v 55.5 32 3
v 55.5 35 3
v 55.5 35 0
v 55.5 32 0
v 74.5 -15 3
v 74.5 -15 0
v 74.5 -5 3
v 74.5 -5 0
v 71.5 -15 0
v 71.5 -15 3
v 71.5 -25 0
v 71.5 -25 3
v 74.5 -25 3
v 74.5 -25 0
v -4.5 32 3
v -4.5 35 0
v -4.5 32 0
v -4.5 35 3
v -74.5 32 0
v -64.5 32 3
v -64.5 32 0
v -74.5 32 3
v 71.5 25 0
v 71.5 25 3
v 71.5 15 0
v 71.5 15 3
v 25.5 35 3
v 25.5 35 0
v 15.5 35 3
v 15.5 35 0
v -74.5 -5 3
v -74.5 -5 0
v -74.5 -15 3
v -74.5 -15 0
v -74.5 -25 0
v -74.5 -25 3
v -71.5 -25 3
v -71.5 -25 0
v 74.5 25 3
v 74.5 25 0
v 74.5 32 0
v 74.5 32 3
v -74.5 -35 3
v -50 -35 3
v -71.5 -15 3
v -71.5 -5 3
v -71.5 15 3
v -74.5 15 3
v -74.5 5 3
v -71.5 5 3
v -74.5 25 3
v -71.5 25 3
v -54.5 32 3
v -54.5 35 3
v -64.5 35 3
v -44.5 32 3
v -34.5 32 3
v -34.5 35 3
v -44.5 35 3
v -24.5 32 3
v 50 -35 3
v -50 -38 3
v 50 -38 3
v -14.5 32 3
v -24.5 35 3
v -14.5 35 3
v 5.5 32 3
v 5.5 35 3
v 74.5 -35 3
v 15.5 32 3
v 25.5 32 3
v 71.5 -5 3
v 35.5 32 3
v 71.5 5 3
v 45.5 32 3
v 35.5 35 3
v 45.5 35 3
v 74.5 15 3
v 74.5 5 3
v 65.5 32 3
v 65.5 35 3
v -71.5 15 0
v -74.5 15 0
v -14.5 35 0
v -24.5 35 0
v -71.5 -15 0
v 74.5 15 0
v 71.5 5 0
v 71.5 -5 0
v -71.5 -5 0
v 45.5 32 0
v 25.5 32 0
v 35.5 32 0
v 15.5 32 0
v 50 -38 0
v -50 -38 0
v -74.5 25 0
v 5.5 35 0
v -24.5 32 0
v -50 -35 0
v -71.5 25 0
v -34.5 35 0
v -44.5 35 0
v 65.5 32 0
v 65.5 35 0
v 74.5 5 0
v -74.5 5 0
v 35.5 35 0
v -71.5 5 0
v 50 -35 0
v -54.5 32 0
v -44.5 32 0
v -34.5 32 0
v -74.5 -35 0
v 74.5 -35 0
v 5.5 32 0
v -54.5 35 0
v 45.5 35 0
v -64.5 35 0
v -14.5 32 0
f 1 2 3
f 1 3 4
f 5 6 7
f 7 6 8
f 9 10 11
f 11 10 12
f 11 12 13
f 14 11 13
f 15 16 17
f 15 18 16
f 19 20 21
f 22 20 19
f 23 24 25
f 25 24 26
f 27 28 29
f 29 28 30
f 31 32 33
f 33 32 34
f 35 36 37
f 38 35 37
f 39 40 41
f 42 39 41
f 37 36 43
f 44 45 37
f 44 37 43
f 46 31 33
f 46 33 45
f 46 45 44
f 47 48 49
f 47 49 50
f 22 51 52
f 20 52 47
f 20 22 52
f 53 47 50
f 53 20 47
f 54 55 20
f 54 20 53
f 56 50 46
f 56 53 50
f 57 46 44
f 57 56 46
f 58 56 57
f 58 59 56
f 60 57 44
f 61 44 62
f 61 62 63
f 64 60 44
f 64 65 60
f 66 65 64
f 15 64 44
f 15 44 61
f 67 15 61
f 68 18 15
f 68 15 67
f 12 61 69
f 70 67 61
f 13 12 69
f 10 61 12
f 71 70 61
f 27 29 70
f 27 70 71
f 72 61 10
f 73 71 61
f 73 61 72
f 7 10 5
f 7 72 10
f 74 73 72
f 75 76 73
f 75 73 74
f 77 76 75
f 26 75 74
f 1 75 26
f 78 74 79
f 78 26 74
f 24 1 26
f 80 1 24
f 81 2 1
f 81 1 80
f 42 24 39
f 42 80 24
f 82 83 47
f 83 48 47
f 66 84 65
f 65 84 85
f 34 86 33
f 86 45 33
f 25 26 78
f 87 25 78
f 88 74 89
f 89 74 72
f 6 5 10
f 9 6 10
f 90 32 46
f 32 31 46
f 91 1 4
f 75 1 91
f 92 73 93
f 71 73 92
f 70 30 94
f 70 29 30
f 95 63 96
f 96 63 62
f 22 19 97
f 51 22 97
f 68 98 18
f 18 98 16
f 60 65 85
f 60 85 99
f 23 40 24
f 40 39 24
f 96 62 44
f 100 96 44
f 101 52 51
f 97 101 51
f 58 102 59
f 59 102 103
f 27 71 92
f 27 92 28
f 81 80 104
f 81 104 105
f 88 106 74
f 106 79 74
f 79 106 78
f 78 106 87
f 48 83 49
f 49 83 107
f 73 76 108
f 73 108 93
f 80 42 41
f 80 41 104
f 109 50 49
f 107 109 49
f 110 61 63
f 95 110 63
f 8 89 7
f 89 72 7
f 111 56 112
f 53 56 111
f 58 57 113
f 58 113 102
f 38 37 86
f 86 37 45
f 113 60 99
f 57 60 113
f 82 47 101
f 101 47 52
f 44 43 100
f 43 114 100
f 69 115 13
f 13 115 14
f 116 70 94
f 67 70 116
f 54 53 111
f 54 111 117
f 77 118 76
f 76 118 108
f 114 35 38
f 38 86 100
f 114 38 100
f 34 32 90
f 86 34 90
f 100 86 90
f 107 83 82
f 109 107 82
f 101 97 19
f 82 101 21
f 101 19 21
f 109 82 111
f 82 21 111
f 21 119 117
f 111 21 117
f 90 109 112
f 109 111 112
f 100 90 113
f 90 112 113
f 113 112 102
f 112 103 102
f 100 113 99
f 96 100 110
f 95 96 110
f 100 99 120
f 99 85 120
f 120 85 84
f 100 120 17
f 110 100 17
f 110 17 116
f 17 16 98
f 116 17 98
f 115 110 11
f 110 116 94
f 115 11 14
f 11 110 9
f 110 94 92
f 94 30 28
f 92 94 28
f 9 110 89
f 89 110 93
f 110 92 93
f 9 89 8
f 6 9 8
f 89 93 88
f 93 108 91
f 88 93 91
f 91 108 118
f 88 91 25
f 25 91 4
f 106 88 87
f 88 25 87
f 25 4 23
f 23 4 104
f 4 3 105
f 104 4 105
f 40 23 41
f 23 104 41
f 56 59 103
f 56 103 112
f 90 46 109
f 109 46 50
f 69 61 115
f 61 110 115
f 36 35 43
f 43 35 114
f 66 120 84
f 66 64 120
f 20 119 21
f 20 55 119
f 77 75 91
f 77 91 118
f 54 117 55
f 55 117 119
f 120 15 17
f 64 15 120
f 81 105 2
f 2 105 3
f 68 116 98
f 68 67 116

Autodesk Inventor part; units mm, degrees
ref_plane "YZ Plane" through (0, 0, 0) normal (1, 0, 0) x (0, 1, 0)
ref_plane "XZ Plane" through (0, 0, 0) normal (0, 1, 0) x (-1, 0, 0)
ref_plane "XY Plane" through (0, 0, 0) normal (0, 0, 1) x (1, 0, 0)
sketch "Эскиз1" plane through (0, 0, 0) normal (0, 0, 1) x (1, 0, 0)
  line L0 (-74.5, -35) -> (74.5, -35)
  line L1 (74.5, -35) -> (74.5, 35)
  line L2 (74.5, 35) -> (-74.5, 35)
  line L3 (-74.5, 35) -> (-74.5, -35)
  line L4 (-74.5, -35) -> (74.5, 35) construction
  line L5 (74.5, -35) -> (-74.5, 35) construction
  point P0 (0, 0)
  dimension "d0" = 149
  dimension "d1" = 70
extrude "Выдавливание1" add sketch "Эскиз1" along normal blind 3
sketch "Эскиз2" plane through (0, 0, 3) normal (0, 0, 1) x (1, 0, 0)
  line L0 (74.5, -35) -> (74.5, 35) projected
  line L1 (74.5, 25) -> (71.5, 25)
  line L2 (71.5, 25) -> (71.5, 15)
  line L3 (71.5, 15) -> (74.5, 15)
  line L4 (74.5, 15) -> (74.5, 25)
  line L5 (74.5, 35) -> (-74.5, 35) projected
  point P0 (0, 0)
  dimension "d4" = 3
  dimension "d5" = 10
  dimension "d6" = 10
extrude "Выдавливание2" cut sketch "Эскиз2" against normal blind 3
pattern_linear "Прямоуг.массив1" count 3 spacing 20 along (0, -1, 0) of "Выдавливание2"
mirror "Зеркальное отражение1" about plane through (0, 0, 0) normal (1, 0, 0) of "Выдавливание2", "Прямоуг.массив1"
sketch "Эскиз3" plane through (0, 0, 3) normal (0, 0, 1) x (1, 0, 0)
  line L0 (-74.5, -35) -> (74.5, -35) projected
  line L1 (-50, -35) -> (50, -35)
  line L2 (50, -35) -> (50, -38)
  line L3 (50, -38) -> (-50, -38)
  line L4 (-50, -38) -> (-50, -35)
  line L5 (0, 0) -> (0, -8.2609)
  line L6 (-74.5, -25) -> (-74.5, -35) projected
  dimension "d12" = 3
  dimension "d13" = 24.5
extrude "Выдавливание3" add sketch "Эскиз3" against normal blind 3
sketch "Эскиз4" plane through (0, 0, 3) normal (0, 0, 1) x (1, 0, 0)
  line L0 (74.5, 35) -> (-74.5, 35) projected
  line L1 (-74.5, 35) -> (-64.5, 35)
  line L2 (-64.5, 35) -> (-64.5, 32)
  line L3 (-64.5, 32) -> (-74.5, 32)
  line L4 (-74.5, 32) -> (-74.5, 35)
  line L5 (-74.5, 35) -> (-74.5, 25) projected
  point P0 (0, 0)
  point P1 (-64.5, 35)
  dimension "d16" = 10
  dimension "d17" = 3
  dimension "d18" = 0
extrude "Выдавливание4" cut sketch "Эскиз4" against normal blind 3
pattern_linear "Прямоуг.массив2" count 8 spacing 20 along (1, 0, 0) of "Выдавливание4"
properties part number "000.104 - Back wall"
